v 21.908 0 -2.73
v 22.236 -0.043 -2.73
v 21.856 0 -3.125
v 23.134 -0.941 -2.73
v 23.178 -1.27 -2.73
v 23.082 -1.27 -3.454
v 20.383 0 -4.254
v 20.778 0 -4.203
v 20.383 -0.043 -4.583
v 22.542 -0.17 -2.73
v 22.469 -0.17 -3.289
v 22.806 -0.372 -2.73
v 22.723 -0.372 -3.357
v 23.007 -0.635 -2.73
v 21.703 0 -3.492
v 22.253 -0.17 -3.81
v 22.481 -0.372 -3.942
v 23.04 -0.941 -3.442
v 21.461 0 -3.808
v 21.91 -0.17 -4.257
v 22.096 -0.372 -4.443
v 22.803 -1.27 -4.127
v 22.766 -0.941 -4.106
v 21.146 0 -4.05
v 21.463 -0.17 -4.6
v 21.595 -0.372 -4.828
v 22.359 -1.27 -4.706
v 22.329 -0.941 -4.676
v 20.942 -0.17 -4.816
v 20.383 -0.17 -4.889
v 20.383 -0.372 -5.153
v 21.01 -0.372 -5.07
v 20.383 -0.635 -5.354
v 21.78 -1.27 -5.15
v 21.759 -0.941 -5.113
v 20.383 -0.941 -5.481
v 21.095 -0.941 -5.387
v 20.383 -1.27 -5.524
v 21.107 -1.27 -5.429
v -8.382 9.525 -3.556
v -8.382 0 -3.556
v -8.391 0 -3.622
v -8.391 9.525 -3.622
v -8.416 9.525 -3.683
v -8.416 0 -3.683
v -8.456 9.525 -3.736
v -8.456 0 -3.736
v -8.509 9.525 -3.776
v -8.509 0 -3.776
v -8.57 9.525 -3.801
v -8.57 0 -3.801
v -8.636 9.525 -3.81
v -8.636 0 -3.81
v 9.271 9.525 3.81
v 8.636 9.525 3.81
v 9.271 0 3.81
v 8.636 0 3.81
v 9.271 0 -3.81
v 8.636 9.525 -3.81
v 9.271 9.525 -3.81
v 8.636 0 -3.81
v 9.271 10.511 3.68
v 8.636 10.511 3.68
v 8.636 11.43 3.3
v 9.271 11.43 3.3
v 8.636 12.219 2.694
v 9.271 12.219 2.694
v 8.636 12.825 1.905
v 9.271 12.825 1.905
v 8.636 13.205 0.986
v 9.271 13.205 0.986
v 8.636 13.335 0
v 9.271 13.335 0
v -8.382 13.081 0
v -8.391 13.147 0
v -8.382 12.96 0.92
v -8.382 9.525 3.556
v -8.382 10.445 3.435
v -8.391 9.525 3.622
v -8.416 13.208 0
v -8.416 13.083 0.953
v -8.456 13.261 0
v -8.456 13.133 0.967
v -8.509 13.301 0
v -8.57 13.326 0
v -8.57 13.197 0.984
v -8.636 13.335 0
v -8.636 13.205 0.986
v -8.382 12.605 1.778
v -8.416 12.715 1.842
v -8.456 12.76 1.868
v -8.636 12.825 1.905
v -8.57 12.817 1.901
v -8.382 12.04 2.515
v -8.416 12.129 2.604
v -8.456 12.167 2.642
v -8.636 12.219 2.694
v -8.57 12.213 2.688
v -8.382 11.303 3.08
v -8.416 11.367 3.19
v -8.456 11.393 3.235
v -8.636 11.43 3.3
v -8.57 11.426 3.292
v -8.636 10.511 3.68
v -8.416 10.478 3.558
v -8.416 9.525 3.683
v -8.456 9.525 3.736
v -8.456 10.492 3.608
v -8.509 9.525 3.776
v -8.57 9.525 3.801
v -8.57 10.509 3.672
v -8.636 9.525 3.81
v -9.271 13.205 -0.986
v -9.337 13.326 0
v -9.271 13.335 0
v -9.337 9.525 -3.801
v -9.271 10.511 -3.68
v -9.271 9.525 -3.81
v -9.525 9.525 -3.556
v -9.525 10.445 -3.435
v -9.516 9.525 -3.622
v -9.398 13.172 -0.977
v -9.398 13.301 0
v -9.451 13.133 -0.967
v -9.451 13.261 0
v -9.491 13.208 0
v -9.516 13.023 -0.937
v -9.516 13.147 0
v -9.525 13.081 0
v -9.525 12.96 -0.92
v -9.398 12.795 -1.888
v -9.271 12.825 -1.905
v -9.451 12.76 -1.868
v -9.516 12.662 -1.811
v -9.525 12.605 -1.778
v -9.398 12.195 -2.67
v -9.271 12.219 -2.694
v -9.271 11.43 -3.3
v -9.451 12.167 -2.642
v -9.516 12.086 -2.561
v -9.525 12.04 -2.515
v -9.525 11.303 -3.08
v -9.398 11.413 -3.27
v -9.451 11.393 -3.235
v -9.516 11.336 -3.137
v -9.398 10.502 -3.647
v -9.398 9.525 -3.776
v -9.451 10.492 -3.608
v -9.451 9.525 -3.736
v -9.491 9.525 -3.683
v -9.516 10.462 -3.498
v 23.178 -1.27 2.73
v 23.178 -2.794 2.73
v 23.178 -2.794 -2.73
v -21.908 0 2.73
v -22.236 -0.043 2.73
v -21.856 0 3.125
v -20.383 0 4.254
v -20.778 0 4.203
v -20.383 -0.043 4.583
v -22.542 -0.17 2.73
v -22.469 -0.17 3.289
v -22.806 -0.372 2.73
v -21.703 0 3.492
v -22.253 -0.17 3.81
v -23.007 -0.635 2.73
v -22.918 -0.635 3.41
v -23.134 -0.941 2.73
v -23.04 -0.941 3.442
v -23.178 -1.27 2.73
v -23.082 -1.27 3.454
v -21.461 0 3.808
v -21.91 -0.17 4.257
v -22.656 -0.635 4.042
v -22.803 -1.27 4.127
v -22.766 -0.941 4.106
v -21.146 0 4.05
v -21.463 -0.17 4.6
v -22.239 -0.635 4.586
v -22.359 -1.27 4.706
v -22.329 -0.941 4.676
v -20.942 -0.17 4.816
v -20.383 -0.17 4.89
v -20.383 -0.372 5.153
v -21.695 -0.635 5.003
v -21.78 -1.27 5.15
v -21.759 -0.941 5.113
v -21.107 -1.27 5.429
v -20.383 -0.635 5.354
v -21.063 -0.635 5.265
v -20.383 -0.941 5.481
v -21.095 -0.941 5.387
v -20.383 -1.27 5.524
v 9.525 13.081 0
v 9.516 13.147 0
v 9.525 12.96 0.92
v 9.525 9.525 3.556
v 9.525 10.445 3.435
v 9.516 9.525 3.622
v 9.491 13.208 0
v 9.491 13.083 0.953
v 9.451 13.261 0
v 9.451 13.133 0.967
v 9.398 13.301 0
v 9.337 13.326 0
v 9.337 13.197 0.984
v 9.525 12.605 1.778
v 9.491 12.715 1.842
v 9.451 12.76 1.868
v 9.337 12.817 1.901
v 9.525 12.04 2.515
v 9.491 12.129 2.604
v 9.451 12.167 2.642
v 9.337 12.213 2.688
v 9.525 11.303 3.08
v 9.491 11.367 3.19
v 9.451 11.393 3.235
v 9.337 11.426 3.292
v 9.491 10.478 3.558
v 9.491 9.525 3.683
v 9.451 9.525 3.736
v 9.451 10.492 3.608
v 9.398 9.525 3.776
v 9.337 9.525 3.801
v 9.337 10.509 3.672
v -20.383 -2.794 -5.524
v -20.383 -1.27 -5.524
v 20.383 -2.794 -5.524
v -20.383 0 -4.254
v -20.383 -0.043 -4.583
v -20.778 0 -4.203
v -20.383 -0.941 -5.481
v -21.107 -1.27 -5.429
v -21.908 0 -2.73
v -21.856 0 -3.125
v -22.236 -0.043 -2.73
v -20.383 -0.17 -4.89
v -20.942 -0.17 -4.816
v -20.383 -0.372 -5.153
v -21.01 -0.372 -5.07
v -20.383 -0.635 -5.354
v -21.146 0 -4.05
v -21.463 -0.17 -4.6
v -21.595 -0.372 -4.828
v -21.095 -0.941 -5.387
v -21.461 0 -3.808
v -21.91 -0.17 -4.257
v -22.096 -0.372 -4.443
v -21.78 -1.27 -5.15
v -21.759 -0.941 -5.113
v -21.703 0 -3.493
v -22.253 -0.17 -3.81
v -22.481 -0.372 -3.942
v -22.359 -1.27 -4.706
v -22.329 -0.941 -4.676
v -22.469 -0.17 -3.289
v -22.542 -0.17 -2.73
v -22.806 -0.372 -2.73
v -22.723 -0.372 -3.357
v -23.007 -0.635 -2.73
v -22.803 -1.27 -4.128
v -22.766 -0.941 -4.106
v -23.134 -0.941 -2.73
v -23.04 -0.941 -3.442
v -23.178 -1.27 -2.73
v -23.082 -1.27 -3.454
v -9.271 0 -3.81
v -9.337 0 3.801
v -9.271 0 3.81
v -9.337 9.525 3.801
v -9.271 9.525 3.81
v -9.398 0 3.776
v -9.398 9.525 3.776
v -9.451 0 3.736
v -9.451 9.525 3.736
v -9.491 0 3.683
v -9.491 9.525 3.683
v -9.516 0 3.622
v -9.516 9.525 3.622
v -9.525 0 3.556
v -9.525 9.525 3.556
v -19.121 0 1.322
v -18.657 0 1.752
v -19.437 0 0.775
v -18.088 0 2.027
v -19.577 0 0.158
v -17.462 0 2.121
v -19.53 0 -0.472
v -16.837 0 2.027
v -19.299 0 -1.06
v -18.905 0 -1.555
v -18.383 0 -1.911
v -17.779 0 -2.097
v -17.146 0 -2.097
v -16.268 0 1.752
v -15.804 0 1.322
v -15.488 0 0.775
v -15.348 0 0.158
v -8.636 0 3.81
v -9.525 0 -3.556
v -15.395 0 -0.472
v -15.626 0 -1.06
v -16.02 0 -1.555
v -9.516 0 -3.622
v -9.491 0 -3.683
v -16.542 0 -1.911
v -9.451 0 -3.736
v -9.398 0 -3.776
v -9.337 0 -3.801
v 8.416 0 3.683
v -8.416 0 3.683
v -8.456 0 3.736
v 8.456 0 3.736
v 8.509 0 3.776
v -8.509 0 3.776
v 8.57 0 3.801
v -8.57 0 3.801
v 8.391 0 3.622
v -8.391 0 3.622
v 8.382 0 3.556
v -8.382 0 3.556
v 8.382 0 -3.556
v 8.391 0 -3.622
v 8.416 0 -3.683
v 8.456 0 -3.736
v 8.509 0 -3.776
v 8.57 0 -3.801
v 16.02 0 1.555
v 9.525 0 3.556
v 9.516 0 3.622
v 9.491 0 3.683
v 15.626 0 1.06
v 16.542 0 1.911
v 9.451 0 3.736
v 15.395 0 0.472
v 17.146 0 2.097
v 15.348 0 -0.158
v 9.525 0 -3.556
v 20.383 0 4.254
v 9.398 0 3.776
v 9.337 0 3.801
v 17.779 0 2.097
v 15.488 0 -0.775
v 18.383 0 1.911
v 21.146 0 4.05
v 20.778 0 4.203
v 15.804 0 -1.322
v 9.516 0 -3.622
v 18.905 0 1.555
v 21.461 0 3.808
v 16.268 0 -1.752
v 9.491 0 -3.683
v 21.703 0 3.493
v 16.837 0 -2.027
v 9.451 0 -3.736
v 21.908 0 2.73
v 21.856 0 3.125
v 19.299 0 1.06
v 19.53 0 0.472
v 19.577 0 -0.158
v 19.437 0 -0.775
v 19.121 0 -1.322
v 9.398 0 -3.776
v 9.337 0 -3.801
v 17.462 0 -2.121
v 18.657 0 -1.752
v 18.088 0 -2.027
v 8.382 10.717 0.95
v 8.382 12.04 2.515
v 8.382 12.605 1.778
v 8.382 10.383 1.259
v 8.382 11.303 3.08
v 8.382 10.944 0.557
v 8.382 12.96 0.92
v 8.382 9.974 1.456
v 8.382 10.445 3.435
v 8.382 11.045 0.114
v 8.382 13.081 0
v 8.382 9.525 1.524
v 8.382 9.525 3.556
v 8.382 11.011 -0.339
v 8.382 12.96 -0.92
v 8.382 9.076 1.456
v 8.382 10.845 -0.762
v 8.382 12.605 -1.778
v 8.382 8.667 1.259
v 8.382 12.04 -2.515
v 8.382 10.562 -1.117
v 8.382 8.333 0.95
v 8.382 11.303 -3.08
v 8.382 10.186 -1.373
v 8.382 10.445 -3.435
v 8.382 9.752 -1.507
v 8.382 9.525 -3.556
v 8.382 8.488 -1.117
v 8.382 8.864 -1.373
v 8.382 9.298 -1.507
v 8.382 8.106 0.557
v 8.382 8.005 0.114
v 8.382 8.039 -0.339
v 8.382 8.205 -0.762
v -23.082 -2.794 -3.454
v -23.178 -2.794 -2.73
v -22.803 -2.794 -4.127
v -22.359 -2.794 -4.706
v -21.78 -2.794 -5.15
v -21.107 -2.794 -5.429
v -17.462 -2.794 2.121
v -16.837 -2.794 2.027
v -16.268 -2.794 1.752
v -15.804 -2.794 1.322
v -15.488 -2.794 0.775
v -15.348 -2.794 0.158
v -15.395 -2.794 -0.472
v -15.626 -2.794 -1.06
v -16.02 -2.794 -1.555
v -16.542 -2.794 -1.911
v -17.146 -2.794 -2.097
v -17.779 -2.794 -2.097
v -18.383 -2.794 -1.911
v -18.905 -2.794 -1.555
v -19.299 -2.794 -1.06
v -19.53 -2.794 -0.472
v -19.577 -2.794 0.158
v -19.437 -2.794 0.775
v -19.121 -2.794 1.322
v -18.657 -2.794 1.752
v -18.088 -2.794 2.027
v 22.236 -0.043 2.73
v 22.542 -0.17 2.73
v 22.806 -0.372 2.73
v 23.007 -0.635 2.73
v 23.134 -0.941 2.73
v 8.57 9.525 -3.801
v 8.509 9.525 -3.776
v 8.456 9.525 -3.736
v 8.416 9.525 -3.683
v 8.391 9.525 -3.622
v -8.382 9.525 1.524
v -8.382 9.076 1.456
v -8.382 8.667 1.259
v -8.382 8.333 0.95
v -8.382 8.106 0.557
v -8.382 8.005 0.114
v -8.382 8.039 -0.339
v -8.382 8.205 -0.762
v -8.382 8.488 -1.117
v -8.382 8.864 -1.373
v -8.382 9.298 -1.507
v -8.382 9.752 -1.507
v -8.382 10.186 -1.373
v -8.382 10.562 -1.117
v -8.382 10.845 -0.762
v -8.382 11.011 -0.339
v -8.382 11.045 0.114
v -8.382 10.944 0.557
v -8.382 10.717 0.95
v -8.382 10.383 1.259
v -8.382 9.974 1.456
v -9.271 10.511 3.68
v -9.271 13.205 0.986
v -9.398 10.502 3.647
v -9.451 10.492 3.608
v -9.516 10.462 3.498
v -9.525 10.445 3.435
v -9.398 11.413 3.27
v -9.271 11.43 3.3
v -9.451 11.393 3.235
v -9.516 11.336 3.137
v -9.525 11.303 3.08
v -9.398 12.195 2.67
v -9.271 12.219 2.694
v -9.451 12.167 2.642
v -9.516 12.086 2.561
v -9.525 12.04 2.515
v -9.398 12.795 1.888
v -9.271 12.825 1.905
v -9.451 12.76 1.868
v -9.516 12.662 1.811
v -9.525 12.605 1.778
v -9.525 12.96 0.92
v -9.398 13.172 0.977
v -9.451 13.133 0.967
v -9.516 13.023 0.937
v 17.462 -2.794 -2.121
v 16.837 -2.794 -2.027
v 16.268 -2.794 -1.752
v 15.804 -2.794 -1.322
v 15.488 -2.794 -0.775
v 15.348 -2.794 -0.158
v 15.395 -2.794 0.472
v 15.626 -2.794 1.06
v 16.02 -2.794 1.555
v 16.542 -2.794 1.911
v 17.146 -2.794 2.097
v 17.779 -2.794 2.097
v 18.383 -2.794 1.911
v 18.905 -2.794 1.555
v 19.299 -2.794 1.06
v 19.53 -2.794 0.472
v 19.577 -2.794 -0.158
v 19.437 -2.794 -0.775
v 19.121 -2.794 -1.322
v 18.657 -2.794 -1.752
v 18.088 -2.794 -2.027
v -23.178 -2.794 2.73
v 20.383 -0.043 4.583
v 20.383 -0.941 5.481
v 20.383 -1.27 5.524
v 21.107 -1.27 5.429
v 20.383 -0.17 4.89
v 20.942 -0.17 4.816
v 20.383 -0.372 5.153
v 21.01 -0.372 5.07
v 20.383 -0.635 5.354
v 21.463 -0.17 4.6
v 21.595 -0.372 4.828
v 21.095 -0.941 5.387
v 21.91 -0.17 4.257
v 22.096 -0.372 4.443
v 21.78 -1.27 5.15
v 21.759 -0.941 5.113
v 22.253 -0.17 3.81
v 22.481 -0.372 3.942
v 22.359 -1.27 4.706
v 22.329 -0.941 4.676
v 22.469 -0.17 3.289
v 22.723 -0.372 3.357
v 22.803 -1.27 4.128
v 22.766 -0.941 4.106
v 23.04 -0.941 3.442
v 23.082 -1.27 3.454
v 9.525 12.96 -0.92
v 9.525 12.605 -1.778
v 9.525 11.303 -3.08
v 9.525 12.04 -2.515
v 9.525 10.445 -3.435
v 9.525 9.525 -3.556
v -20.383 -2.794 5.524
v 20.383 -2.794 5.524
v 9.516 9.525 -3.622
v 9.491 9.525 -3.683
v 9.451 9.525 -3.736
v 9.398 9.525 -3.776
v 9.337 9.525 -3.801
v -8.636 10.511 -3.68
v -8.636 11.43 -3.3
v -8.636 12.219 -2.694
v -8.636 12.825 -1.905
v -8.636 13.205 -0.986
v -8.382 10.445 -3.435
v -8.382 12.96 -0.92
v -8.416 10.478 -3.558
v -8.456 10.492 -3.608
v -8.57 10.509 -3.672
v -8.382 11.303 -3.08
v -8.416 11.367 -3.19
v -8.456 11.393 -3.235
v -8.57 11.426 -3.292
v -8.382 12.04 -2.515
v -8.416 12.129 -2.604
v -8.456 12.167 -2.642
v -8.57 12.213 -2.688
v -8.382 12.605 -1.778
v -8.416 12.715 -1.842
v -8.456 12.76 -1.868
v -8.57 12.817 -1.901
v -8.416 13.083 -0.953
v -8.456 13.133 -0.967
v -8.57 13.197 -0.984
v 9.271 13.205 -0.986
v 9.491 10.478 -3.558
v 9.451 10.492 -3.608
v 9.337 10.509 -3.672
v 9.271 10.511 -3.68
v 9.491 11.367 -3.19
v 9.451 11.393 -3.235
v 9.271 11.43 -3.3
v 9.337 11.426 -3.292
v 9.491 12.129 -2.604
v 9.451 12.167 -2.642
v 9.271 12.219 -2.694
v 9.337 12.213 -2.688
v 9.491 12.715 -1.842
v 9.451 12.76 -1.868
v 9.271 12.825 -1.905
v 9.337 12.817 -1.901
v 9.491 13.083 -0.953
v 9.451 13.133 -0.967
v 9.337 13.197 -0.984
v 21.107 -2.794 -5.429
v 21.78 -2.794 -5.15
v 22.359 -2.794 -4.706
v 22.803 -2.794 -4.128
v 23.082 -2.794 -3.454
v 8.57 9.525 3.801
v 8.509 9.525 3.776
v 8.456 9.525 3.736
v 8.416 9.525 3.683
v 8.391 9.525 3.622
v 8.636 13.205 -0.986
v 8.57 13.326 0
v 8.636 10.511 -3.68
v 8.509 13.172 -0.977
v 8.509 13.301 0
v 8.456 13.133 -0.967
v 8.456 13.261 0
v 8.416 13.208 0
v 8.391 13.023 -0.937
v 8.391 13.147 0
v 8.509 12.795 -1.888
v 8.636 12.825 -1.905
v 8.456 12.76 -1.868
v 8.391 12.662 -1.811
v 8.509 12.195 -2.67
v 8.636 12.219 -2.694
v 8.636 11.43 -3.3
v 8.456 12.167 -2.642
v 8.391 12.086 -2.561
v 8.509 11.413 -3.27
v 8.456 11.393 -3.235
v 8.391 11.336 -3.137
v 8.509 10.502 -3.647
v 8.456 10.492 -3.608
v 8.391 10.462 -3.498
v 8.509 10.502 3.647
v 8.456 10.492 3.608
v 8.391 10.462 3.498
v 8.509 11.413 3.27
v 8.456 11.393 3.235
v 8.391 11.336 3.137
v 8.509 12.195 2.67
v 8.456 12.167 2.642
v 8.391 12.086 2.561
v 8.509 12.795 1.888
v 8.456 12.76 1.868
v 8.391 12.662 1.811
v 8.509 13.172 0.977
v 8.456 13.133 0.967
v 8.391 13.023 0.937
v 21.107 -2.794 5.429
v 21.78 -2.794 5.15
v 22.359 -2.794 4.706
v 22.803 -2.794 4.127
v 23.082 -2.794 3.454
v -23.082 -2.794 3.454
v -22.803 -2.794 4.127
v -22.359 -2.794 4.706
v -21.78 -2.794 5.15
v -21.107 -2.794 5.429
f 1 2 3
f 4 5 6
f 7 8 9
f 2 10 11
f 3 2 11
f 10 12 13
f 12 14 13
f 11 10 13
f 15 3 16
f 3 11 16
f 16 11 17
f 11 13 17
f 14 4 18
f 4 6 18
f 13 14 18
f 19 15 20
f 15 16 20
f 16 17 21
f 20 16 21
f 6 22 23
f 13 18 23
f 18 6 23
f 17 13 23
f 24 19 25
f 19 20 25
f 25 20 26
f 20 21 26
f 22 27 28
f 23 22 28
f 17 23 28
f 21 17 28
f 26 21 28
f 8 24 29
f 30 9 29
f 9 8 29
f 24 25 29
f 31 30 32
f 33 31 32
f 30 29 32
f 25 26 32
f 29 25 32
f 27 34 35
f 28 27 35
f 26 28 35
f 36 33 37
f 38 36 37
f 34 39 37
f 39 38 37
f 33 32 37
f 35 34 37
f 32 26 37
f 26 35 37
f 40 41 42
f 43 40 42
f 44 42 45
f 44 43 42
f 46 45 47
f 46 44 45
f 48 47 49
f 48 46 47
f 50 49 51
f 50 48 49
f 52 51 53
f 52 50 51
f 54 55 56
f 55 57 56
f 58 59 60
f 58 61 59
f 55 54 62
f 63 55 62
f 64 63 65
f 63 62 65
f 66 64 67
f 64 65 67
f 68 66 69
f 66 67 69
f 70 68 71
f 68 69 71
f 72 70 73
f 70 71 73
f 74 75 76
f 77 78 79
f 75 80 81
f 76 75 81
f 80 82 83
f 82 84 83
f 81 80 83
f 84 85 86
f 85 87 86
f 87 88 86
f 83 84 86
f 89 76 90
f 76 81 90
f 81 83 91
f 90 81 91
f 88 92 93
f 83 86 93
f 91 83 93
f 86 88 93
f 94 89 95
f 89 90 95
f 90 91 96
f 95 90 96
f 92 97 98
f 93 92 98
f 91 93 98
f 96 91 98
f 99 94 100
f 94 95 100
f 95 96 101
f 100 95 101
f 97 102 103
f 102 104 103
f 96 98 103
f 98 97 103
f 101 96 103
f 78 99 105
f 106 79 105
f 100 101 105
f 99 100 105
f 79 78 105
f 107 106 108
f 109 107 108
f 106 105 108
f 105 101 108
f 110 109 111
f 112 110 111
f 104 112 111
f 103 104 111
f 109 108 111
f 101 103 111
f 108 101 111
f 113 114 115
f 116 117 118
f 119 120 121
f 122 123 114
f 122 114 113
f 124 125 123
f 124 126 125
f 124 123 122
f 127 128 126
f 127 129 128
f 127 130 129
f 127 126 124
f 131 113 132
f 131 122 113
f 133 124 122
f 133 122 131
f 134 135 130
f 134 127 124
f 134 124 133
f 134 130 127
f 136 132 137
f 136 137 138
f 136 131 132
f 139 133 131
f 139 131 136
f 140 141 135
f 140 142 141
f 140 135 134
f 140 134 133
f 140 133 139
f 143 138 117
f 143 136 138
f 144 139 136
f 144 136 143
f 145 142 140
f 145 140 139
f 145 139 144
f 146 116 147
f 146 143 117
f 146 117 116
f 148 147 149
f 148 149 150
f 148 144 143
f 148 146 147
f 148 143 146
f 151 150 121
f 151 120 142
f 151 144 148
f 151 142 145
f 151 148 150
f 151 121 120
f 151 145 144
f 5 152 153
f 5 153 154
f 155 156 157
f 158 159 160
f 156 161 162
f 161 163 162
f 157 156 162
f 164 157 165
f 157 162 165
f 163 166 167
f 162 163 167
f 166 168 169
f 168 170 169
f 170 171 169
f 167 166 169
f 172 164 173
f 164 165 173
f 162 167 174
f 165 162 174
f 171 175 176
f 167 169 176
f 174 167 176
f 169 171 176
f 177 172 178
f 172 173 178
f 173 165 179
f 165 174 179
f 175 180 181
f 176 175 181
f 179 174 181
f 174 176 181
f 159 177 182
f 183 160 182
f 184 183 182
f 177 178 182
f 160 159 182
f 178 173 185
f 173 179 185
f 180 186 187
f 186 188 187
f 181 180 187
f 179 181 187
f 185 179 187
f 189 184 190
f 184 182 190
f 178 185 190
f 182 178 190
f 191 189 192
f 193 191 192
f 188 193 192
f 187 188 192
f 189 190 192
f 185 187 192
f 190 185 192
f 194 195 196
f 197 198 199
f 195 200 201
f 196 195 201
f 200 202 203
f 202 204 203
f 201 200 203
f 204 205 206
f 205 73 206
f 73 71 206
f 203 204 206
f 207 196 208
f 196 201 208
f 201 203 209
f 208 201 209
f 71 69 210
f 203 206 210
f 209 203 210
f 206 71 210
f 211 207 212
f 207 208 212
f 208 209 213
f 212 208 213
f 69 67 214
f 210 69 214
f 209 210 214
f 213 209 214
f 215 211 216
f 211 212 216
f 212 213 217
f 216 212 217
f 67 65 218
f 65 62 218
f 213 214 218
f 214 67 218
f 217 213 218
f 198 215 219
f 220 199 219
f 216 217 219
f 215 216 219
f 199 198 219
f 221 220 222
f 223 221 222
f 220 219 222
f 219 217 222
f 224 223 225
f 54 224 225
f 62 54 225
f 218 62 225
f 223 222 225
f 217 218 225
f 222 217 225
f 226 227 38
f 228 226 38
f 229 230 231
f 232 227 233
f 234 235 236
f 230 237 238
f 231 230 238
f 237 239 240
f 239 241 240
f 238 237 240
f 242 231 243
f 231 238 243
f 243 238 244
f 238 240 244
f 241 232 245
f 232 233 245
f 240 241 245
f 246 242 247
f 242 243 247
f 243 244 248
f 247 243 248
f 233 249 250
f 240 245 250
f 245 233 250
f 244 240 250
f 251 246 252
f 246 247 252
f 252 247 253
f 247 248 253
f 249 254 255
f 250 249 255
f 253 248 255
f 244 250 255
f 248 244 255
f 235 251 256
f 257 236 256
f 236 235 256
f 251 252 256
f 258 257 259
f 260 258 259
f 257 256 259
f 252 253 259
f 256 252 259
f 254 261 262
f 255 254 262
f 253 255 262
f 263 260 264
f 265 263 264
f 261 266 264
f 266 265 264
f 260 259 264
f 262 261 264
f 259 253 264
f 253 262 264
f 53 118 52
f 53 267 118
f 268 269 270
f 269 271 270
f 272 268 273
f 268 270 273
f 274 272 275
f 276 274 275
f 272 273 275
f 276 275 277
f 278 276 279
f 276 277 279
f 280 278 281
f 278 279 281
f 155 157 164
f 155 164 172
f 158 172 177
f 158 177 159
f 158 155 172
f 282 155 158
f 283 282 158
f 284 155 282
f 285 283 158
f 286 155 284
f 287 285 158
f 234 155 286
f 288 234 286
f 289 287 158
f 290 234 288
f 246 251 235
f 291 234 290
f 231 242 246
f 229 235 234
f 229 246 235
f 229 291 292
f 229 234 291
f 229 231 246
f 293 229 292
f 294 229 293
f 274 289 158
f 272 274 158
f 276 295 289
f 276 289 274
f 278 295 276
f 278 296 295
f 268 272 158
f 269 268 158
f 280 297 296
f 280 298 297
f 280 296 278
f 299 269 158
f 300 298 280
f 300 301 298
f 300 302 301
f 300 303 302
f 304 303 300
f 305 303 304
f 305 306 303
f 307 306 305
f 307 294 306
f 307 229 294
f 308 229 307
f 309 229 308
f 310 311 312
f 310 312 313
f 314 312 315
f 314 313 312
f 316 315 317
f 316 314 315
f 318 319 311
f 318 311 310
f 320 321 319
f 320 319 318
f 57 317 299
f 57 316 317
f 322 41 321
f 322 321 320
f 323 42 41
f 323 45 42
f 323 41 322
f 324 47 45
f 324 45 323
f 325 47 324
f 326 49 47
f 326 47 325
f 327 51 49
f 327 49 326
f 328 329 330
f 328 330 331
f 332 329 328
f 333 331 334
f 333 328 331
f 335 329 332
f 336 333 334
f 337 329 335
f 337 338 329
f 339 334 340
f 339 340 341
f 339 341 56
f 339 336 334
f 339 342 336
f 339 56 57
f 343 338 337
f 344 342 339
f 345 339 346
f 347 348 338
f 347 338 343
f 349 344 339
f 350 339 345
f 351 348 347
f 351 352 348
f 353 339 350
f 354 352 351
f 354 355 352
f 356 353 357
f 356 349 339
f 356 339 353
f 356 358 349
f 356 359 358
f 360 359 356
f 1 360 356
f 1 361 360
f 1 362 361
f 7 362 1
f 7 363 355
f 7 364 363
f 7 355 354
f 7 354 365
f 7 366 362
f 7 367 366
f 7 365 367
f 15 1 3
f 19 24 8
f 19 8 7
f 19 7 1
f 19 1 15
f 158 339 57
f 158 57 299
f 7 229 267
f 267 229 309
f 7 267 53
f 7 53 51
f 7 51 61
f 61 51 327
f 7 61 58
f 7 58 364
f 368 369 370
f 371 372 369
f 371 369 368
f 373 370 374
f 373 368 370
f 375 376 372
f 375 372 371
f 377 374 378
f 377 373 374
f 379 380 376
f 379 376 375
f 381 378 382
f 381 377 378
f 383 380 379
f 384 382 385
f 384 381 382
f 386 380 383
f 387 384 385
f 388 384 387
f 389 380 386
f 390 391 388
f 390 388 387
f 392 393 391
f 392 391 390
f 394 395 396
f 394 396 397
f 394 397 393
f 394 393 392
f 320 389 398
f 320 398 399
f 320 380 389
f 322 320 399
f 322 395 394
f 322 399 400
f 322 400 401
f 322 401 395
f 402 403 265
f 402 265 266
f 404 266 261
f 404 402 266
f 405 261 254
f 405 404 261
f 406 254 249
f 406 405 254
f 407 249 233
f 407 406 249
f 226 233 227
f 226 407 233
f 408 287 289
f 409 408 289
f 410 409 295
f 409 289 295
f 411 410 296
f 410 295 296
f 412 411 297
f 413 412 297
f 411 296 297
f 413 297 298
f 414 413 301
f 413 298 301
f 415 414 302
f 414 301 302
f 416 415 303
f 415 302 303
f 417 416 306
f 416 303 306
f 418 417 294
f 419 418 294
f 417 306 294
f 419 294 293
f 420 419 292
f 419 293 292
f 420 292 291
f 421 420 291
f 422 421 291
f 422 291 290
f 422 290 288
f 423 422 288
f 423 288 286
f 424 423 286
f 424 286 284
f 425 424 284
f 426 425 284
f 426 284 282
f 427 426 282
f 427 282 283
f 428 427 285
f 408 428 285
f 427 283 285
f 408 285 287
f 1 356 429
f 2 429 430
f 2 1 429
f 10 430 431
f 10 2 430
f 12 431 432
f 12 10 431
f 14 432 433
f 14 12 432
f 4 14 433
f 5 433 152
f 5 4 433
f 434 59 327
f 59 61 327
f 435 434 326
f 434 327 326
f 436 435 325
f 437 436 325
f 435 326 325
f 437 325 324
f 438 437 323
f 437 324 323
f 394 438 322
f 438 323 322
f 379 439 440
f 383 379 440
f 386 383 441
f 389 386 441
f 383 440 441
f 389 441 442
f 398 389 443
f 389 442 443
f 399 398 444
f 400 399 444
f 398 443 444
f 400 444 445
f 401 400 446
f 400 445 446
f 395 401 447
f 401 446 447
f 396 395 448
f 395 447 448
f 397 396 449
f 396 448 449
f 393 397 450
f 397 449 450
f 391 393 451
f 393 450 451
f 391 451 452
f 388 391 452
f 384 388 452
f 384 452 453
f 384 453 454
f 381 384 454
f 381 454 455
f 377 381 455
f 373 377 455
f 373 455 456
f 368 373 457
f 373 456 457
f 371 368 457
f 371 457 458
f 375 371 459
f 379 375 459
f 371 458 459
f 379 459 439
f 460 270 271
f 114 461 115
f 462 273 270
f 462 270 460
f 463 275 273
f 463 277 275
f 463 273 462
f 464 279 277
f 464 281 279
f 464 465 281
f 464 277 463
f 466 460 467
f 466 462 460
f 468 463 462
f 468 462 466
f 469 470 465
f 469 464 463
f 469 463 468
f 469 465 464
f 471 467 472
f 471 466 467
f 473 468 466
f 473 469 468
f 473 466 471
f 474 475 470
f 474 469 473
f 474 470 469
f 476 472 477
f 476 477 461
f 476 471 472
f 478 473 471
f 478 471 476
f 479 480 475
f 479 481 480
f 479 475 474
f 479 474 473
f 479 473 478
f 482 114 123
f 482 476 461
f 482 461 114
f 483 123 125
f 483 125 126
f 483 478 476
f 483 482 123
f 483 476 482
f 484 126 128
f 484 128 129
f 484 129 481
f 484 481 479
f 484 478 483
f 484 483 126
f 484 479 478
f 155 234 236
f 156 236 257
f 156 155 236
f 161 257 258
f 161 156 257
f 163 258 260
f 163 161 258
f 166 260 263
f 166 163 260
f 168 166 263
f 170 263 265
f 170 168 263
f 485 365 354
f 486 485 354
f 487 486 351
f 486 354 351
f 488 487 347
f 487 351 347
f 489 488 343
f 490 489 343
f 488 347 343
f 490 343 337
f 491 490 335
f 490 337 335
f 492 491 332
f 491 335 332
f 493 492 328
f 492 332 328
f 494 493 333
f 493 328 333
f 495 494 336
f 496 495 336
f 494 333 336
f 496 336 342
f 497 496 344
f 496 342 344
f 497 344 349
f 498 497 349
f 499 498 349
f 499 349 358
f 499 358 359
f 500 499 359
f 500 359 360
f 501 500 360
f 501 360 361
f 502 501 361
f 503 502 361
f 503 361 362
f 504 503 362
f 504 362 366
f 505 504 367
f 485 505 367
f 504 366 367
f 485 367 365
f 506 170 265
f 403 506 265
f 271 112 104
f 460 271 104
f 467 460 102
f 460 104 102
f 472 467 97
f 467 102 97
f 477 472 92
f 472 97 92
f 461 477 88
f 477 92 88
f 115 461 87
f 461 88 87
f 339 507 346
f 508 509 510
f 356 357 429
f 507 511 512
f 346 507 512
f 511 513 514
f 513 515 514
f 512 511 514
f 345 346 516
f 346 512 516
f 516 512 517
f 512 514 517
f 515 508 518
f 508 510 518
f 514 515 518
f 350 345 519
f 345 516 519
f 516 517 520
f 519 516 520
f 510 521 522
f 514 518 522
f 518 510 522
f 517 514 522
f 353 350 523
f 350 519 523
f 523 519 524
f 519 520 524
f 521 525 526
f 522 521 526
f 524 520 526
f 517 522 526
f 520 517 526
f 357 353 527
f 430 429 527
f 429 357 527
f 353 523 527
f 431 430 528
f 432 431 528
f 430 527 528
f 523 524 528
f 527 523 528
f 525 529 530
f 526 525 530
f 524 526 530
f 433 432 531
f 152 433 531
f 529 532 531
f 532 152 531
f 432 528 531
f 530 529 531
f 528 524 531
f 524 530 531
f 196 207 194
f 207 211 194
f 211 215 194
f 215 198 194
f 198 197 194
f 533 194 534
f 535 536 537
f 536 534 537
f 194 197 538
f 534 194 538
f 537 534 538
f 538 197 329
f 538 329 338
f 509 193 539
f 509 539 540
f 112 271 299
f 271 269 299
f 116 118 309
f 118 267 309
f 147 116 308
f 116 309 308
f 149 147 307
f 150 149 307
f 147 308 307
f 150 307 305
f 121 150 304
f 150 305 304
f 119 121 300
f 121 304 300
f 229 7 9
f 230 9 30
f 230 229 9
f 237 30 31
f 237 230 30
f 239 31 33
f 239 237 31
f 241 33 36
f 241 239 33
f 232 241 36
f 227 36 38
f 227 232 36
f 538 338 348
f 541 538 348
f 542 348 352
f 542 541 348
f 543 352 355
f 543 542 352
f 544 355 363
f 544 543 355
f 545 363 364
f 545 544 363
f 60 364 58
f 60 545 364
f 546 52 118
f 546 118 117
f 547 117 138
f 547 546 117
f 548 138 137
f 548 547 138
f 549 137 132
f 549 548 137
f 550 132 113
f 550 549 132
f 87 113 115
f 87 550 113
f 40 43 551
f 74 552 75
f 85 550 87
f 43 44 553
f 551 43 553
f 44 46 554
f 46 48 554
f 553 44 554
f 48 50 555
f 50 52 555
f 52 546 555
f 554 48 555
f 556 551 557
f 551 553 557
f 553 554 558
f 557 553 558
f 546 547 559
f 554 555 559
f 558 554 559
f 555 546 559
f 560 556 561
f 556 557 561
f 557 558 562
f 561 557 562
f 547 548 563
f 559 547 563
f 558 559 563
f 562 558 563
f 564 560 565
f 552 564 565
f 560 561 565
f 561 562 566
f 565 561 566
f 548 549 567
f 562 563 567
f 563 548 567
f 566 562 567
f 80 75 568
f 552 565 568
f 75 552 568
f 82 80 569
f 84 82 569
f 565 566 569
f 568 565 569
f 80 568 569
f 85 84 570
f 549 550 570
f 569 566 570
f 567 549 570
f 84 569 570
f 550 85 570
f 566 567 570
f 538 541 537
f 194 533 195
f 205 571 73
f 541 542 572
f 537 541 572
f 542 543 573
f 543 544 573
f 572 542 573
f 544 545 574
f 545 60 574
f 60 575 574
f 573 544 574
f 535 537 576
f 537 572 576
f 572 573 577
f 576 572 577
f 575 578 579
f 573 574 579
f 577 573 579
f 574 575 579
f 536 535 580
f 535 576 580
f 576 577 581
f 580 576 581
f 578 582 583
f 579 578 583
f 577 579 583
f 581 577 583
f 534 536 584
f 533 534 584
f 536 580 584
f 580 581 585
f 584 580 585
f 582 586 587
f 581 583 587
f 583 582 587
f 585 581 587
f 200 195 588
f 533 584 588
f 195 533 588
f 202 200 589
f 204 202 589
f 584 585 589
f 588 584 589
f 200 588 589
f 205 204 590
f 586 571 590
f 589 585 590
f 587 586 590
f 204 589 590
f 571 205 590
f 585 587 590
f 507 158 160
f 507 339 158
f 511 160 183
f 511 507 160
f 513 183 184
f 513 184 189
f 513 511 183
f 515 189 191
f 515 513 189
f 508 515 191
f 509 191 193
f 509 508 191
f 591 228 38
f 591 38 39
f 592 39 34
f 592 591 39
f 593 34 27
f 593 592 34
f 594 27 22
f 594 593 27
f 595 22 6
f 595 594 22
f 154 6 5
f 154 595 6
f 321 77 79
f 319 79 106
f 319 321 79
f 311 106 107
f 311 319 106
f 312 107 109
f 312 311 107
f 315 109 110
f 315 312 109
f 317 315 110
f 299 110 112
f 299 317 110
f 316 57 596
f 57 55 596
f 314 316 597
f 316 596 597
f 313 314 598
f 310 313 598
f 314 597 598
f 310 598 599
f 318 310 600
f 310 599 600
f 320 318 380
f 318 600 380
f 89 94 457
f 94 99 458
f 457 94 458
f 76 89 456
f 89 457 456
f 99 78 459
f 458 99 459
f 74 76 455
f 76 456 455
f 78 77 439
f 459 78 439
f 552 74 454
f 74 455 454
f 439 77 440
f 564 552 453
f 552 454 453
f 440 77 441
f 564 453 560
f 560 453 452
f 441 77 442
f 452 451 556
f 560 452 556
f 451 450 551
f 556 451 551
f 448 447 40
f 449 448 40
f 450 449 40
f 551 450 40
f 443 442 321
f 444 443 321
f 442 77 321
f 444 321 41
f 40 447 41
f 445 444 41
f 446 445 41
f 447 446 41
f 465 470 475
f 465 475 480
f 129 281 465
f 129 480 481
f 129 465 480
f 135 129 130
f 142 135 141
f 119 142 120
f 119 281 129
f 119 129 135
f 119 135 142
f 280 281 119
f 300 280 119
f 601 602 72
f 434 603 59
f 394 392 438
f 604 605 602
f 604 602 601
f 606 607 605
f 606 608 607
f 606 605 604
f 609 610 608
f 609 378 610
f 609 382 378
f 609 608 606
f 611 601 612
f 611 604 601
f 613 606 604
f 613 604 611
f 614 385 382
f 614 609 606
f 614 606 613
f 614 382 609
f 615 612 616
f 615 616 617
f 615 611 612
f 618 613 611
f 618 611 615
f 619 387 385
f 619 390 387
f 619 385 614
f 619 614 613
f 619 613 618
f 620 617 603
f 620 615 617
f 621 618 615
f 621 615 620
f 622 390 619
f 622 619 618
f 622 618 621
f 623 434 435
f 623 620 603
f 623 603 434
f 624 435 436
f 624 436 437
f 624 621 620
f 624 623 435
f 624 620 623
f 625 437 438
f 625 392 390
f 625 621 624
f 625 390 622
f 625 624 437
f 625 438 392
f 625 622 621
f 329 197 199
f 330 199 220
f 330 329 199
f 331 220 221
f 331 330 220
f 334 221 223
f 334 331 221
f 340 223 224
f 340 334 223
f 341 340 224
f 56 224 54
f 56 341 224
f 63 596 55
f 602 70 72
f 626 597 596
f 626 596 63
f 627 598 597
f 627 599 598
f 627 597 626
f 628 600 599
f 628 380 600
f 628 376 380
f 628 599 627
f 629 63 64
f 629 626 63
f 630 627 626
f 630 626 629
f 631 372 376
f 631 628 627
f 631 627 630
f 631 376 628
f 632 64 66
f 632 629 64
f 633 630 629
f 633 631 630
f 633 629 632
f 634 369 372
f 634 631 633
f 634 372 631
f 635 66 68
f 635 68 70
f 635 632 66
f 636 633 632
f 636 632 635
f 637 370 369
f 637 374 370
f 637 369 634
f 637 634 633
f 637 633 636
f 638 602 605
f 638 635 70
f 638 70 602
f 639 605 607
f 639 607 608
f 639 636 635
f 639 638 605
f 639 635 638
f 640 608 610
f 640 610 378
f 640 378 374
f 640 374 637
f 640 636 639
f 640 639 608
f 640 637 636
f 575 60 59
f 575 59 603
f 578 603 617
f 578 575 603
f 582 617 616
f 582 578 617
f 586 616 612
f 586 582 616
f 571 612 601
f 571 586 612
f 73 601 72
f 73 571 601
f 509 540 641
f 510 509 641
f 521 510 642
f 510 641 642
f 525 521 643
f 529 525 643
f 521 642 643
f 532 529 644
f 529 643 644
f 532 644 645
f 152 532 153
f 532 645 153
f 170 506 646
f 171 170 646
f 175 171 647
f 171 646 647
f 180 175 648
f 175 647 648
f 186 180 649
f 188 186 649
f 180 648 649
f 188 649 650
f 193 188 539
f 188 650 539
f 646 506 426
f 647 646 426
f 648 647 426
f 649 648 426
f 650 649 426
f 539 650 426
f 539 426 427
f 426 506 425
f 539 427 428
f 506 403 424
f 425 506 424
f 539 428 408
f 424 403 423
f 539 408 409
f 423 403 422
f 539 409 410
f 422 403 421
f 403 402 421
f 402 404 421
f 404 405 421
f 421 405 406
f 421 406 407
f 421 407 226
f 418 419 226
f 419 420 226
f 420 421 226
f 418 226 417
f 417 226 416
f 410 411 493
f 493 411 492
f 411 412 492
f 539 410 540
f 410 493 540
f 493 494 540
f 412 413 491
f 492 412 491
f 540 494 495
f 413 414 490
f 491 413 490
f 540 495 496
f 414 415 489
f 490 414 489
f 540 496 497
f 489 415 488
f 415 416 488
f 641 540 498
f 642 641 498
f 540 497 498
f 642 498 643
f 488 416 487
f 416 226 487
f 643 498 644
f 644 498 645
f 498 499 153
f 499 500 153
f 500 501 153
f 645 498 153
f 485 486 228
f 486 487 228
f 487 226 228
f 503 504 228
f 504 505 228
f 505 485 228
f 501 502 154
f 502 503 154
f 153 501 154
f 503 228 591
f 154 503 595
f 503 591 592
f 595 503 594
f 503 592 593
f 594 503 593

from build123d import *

# Parameters (mm, degrees)
SKETCH1_W           = 46.355
SKETCH1_H           = 11.049
SKETCH1_R           = 2.1209
BOSS_EXTRUDE1_DEPTH = 2.794
SKETCH2_W           = 1.143
SKETCH2_H           = 7.62
BOSS_EXTRUDE2_DEPTH = 13.335
FILLET1_R           = 3.81
SKETCH3_R           = 1.524
BOSS_EXTRUDE3_DEPTH = 16.764
FILLET2_R           = 2.794
FILLET3_R           = 1.27
FILLET4_R           = 0.254


with BuildPart() as part:
    # Sketch1 → Boss-Extrude1 (new body)
    with BuildSketch(Plane(origin=(0, 0, 0), x_dir=(1, 0, 0), z_dir=(0, 1, 0))):
        Rectangle(SKETCH1_W, SKETCH1_H)
        with Locations(Location((-17.4625, 0, 0), (0, 0, 270))):
            Circle(SKETCH1_R, mode=Mode.SUBTRACT)
        with Locations(Location((17.4625, 0, 0), (0, 0, 90))):
            Circle(SKETCH1_R, mode=Mode.SUBTRACT)
    extrude(amount=-BOSS_EXTRUDE1_DEPTH)

    # Sketch2 → Boss-Extrude2 (add)
    with BuildSketch(Plane(origin=(0, 0, 0), x_dir=(1, 0, 0), z_dir=(0, 1, 0))):
        with Locations((8.9535, 0)):
            Rectangle(SKETCH2_W, SKETCH2_H)
        with Locations((-8.9535, 0)):
            Rectangle(SKETCH2_W, SKETCH2_H)
    extrude(amount=BOSS_EXTRUDE2_DEPTH)

    # Fillet1
    fillet1_edges = [part.edges().sort_by_distance(p)[0] for p in [
        (-8.9535, 13.335, -3.81),
        (-8.9535, 13.335, 3.81),
        (8.9535, 13.335, -3.81),
        (8.9535, 13.335, 3.81),
    ]]
    fillet(fillet1_edges, radius=FILLET1_R - 0.0001)  # a hair under: the kernel refuses the full size

    # Sketch3 → Boss-Extrude3 (add)
    with BuildSketch(Plane(origin=(-8.382, 0, 0), x_dir=(0, 0, -1), z_dir=(1, 0, 0))):
        with Locations(Location((0, 9.525, 0), (0, 0, 180))):
            Circle(SKETCH3_R)
    extrude(amount=BOSS_EXTRUDE3_DEPTH)

    # Fillet2
    fillet2_edges = [part.edges().sort_by_distance(p)[0] for p in [
        (-23.1775, -1.397, -5.5245),
        (23.1775, -1.397, -5.5245),
        (23.1775, -1.397, 5.5245),
        (-23.1775, -1.397, 5.5245),
    ]]
    fillet(fillet2_edges, radius=FILLET2_R)

    # Fillet3
    fillet3_edges = [part.edges().sort_by_distance(p)[0] for p in [
        (0, 0, 5.5245),
        (-23.1775, 0, 0),
        (23.1775, 0, 0),
        (0, 0, -5.5245),
        (-22.359156347, 0, 4.706156347),
        (-22.359156347, 0, -4.706156347),
        (22.359156347, 0, -4.706156347),
        (22.359156347, 0, 4.706156347),
    ]]
    fillet(fillet3_edges, radius=FILLET3_R)

    # Fillet4
    fillet4_edges = [part.edges().sort_by_distance(p)[0] for p in [
        (-9.525, 4.76255, 3.81),
        (-9.525, 4.76255, -3.81),
        (-9.525, 12.219106126, 2.694106126),
        (-9.525, 12.219106126, -2.694106126),
        (-8.382, 4.76255, -3.81),
        (-8.382, 4.76255, 3.81),
        (-8.382, 12.219106126, 2.694106126),
        (-8.382, 12.219106126, -2.694106126),
        (8.382, 4.76255, 3.81),
        (8.382, 4.76255, -3.81),
        (8.382, 12.219106126, 2.694106126),
        (8.382, 12.219106126, -2.694106126),
        (9.525, 4.76255, -3.81),
        (9.525, 4.76255, 3.81),
        (9.525, 12.219106126, 2.694106126),
        (9.525, 12.219106126, -2.694106126),
    ]]
    fillet(fillet4_edges, radius=FILLET4_R)


solid = part.part
